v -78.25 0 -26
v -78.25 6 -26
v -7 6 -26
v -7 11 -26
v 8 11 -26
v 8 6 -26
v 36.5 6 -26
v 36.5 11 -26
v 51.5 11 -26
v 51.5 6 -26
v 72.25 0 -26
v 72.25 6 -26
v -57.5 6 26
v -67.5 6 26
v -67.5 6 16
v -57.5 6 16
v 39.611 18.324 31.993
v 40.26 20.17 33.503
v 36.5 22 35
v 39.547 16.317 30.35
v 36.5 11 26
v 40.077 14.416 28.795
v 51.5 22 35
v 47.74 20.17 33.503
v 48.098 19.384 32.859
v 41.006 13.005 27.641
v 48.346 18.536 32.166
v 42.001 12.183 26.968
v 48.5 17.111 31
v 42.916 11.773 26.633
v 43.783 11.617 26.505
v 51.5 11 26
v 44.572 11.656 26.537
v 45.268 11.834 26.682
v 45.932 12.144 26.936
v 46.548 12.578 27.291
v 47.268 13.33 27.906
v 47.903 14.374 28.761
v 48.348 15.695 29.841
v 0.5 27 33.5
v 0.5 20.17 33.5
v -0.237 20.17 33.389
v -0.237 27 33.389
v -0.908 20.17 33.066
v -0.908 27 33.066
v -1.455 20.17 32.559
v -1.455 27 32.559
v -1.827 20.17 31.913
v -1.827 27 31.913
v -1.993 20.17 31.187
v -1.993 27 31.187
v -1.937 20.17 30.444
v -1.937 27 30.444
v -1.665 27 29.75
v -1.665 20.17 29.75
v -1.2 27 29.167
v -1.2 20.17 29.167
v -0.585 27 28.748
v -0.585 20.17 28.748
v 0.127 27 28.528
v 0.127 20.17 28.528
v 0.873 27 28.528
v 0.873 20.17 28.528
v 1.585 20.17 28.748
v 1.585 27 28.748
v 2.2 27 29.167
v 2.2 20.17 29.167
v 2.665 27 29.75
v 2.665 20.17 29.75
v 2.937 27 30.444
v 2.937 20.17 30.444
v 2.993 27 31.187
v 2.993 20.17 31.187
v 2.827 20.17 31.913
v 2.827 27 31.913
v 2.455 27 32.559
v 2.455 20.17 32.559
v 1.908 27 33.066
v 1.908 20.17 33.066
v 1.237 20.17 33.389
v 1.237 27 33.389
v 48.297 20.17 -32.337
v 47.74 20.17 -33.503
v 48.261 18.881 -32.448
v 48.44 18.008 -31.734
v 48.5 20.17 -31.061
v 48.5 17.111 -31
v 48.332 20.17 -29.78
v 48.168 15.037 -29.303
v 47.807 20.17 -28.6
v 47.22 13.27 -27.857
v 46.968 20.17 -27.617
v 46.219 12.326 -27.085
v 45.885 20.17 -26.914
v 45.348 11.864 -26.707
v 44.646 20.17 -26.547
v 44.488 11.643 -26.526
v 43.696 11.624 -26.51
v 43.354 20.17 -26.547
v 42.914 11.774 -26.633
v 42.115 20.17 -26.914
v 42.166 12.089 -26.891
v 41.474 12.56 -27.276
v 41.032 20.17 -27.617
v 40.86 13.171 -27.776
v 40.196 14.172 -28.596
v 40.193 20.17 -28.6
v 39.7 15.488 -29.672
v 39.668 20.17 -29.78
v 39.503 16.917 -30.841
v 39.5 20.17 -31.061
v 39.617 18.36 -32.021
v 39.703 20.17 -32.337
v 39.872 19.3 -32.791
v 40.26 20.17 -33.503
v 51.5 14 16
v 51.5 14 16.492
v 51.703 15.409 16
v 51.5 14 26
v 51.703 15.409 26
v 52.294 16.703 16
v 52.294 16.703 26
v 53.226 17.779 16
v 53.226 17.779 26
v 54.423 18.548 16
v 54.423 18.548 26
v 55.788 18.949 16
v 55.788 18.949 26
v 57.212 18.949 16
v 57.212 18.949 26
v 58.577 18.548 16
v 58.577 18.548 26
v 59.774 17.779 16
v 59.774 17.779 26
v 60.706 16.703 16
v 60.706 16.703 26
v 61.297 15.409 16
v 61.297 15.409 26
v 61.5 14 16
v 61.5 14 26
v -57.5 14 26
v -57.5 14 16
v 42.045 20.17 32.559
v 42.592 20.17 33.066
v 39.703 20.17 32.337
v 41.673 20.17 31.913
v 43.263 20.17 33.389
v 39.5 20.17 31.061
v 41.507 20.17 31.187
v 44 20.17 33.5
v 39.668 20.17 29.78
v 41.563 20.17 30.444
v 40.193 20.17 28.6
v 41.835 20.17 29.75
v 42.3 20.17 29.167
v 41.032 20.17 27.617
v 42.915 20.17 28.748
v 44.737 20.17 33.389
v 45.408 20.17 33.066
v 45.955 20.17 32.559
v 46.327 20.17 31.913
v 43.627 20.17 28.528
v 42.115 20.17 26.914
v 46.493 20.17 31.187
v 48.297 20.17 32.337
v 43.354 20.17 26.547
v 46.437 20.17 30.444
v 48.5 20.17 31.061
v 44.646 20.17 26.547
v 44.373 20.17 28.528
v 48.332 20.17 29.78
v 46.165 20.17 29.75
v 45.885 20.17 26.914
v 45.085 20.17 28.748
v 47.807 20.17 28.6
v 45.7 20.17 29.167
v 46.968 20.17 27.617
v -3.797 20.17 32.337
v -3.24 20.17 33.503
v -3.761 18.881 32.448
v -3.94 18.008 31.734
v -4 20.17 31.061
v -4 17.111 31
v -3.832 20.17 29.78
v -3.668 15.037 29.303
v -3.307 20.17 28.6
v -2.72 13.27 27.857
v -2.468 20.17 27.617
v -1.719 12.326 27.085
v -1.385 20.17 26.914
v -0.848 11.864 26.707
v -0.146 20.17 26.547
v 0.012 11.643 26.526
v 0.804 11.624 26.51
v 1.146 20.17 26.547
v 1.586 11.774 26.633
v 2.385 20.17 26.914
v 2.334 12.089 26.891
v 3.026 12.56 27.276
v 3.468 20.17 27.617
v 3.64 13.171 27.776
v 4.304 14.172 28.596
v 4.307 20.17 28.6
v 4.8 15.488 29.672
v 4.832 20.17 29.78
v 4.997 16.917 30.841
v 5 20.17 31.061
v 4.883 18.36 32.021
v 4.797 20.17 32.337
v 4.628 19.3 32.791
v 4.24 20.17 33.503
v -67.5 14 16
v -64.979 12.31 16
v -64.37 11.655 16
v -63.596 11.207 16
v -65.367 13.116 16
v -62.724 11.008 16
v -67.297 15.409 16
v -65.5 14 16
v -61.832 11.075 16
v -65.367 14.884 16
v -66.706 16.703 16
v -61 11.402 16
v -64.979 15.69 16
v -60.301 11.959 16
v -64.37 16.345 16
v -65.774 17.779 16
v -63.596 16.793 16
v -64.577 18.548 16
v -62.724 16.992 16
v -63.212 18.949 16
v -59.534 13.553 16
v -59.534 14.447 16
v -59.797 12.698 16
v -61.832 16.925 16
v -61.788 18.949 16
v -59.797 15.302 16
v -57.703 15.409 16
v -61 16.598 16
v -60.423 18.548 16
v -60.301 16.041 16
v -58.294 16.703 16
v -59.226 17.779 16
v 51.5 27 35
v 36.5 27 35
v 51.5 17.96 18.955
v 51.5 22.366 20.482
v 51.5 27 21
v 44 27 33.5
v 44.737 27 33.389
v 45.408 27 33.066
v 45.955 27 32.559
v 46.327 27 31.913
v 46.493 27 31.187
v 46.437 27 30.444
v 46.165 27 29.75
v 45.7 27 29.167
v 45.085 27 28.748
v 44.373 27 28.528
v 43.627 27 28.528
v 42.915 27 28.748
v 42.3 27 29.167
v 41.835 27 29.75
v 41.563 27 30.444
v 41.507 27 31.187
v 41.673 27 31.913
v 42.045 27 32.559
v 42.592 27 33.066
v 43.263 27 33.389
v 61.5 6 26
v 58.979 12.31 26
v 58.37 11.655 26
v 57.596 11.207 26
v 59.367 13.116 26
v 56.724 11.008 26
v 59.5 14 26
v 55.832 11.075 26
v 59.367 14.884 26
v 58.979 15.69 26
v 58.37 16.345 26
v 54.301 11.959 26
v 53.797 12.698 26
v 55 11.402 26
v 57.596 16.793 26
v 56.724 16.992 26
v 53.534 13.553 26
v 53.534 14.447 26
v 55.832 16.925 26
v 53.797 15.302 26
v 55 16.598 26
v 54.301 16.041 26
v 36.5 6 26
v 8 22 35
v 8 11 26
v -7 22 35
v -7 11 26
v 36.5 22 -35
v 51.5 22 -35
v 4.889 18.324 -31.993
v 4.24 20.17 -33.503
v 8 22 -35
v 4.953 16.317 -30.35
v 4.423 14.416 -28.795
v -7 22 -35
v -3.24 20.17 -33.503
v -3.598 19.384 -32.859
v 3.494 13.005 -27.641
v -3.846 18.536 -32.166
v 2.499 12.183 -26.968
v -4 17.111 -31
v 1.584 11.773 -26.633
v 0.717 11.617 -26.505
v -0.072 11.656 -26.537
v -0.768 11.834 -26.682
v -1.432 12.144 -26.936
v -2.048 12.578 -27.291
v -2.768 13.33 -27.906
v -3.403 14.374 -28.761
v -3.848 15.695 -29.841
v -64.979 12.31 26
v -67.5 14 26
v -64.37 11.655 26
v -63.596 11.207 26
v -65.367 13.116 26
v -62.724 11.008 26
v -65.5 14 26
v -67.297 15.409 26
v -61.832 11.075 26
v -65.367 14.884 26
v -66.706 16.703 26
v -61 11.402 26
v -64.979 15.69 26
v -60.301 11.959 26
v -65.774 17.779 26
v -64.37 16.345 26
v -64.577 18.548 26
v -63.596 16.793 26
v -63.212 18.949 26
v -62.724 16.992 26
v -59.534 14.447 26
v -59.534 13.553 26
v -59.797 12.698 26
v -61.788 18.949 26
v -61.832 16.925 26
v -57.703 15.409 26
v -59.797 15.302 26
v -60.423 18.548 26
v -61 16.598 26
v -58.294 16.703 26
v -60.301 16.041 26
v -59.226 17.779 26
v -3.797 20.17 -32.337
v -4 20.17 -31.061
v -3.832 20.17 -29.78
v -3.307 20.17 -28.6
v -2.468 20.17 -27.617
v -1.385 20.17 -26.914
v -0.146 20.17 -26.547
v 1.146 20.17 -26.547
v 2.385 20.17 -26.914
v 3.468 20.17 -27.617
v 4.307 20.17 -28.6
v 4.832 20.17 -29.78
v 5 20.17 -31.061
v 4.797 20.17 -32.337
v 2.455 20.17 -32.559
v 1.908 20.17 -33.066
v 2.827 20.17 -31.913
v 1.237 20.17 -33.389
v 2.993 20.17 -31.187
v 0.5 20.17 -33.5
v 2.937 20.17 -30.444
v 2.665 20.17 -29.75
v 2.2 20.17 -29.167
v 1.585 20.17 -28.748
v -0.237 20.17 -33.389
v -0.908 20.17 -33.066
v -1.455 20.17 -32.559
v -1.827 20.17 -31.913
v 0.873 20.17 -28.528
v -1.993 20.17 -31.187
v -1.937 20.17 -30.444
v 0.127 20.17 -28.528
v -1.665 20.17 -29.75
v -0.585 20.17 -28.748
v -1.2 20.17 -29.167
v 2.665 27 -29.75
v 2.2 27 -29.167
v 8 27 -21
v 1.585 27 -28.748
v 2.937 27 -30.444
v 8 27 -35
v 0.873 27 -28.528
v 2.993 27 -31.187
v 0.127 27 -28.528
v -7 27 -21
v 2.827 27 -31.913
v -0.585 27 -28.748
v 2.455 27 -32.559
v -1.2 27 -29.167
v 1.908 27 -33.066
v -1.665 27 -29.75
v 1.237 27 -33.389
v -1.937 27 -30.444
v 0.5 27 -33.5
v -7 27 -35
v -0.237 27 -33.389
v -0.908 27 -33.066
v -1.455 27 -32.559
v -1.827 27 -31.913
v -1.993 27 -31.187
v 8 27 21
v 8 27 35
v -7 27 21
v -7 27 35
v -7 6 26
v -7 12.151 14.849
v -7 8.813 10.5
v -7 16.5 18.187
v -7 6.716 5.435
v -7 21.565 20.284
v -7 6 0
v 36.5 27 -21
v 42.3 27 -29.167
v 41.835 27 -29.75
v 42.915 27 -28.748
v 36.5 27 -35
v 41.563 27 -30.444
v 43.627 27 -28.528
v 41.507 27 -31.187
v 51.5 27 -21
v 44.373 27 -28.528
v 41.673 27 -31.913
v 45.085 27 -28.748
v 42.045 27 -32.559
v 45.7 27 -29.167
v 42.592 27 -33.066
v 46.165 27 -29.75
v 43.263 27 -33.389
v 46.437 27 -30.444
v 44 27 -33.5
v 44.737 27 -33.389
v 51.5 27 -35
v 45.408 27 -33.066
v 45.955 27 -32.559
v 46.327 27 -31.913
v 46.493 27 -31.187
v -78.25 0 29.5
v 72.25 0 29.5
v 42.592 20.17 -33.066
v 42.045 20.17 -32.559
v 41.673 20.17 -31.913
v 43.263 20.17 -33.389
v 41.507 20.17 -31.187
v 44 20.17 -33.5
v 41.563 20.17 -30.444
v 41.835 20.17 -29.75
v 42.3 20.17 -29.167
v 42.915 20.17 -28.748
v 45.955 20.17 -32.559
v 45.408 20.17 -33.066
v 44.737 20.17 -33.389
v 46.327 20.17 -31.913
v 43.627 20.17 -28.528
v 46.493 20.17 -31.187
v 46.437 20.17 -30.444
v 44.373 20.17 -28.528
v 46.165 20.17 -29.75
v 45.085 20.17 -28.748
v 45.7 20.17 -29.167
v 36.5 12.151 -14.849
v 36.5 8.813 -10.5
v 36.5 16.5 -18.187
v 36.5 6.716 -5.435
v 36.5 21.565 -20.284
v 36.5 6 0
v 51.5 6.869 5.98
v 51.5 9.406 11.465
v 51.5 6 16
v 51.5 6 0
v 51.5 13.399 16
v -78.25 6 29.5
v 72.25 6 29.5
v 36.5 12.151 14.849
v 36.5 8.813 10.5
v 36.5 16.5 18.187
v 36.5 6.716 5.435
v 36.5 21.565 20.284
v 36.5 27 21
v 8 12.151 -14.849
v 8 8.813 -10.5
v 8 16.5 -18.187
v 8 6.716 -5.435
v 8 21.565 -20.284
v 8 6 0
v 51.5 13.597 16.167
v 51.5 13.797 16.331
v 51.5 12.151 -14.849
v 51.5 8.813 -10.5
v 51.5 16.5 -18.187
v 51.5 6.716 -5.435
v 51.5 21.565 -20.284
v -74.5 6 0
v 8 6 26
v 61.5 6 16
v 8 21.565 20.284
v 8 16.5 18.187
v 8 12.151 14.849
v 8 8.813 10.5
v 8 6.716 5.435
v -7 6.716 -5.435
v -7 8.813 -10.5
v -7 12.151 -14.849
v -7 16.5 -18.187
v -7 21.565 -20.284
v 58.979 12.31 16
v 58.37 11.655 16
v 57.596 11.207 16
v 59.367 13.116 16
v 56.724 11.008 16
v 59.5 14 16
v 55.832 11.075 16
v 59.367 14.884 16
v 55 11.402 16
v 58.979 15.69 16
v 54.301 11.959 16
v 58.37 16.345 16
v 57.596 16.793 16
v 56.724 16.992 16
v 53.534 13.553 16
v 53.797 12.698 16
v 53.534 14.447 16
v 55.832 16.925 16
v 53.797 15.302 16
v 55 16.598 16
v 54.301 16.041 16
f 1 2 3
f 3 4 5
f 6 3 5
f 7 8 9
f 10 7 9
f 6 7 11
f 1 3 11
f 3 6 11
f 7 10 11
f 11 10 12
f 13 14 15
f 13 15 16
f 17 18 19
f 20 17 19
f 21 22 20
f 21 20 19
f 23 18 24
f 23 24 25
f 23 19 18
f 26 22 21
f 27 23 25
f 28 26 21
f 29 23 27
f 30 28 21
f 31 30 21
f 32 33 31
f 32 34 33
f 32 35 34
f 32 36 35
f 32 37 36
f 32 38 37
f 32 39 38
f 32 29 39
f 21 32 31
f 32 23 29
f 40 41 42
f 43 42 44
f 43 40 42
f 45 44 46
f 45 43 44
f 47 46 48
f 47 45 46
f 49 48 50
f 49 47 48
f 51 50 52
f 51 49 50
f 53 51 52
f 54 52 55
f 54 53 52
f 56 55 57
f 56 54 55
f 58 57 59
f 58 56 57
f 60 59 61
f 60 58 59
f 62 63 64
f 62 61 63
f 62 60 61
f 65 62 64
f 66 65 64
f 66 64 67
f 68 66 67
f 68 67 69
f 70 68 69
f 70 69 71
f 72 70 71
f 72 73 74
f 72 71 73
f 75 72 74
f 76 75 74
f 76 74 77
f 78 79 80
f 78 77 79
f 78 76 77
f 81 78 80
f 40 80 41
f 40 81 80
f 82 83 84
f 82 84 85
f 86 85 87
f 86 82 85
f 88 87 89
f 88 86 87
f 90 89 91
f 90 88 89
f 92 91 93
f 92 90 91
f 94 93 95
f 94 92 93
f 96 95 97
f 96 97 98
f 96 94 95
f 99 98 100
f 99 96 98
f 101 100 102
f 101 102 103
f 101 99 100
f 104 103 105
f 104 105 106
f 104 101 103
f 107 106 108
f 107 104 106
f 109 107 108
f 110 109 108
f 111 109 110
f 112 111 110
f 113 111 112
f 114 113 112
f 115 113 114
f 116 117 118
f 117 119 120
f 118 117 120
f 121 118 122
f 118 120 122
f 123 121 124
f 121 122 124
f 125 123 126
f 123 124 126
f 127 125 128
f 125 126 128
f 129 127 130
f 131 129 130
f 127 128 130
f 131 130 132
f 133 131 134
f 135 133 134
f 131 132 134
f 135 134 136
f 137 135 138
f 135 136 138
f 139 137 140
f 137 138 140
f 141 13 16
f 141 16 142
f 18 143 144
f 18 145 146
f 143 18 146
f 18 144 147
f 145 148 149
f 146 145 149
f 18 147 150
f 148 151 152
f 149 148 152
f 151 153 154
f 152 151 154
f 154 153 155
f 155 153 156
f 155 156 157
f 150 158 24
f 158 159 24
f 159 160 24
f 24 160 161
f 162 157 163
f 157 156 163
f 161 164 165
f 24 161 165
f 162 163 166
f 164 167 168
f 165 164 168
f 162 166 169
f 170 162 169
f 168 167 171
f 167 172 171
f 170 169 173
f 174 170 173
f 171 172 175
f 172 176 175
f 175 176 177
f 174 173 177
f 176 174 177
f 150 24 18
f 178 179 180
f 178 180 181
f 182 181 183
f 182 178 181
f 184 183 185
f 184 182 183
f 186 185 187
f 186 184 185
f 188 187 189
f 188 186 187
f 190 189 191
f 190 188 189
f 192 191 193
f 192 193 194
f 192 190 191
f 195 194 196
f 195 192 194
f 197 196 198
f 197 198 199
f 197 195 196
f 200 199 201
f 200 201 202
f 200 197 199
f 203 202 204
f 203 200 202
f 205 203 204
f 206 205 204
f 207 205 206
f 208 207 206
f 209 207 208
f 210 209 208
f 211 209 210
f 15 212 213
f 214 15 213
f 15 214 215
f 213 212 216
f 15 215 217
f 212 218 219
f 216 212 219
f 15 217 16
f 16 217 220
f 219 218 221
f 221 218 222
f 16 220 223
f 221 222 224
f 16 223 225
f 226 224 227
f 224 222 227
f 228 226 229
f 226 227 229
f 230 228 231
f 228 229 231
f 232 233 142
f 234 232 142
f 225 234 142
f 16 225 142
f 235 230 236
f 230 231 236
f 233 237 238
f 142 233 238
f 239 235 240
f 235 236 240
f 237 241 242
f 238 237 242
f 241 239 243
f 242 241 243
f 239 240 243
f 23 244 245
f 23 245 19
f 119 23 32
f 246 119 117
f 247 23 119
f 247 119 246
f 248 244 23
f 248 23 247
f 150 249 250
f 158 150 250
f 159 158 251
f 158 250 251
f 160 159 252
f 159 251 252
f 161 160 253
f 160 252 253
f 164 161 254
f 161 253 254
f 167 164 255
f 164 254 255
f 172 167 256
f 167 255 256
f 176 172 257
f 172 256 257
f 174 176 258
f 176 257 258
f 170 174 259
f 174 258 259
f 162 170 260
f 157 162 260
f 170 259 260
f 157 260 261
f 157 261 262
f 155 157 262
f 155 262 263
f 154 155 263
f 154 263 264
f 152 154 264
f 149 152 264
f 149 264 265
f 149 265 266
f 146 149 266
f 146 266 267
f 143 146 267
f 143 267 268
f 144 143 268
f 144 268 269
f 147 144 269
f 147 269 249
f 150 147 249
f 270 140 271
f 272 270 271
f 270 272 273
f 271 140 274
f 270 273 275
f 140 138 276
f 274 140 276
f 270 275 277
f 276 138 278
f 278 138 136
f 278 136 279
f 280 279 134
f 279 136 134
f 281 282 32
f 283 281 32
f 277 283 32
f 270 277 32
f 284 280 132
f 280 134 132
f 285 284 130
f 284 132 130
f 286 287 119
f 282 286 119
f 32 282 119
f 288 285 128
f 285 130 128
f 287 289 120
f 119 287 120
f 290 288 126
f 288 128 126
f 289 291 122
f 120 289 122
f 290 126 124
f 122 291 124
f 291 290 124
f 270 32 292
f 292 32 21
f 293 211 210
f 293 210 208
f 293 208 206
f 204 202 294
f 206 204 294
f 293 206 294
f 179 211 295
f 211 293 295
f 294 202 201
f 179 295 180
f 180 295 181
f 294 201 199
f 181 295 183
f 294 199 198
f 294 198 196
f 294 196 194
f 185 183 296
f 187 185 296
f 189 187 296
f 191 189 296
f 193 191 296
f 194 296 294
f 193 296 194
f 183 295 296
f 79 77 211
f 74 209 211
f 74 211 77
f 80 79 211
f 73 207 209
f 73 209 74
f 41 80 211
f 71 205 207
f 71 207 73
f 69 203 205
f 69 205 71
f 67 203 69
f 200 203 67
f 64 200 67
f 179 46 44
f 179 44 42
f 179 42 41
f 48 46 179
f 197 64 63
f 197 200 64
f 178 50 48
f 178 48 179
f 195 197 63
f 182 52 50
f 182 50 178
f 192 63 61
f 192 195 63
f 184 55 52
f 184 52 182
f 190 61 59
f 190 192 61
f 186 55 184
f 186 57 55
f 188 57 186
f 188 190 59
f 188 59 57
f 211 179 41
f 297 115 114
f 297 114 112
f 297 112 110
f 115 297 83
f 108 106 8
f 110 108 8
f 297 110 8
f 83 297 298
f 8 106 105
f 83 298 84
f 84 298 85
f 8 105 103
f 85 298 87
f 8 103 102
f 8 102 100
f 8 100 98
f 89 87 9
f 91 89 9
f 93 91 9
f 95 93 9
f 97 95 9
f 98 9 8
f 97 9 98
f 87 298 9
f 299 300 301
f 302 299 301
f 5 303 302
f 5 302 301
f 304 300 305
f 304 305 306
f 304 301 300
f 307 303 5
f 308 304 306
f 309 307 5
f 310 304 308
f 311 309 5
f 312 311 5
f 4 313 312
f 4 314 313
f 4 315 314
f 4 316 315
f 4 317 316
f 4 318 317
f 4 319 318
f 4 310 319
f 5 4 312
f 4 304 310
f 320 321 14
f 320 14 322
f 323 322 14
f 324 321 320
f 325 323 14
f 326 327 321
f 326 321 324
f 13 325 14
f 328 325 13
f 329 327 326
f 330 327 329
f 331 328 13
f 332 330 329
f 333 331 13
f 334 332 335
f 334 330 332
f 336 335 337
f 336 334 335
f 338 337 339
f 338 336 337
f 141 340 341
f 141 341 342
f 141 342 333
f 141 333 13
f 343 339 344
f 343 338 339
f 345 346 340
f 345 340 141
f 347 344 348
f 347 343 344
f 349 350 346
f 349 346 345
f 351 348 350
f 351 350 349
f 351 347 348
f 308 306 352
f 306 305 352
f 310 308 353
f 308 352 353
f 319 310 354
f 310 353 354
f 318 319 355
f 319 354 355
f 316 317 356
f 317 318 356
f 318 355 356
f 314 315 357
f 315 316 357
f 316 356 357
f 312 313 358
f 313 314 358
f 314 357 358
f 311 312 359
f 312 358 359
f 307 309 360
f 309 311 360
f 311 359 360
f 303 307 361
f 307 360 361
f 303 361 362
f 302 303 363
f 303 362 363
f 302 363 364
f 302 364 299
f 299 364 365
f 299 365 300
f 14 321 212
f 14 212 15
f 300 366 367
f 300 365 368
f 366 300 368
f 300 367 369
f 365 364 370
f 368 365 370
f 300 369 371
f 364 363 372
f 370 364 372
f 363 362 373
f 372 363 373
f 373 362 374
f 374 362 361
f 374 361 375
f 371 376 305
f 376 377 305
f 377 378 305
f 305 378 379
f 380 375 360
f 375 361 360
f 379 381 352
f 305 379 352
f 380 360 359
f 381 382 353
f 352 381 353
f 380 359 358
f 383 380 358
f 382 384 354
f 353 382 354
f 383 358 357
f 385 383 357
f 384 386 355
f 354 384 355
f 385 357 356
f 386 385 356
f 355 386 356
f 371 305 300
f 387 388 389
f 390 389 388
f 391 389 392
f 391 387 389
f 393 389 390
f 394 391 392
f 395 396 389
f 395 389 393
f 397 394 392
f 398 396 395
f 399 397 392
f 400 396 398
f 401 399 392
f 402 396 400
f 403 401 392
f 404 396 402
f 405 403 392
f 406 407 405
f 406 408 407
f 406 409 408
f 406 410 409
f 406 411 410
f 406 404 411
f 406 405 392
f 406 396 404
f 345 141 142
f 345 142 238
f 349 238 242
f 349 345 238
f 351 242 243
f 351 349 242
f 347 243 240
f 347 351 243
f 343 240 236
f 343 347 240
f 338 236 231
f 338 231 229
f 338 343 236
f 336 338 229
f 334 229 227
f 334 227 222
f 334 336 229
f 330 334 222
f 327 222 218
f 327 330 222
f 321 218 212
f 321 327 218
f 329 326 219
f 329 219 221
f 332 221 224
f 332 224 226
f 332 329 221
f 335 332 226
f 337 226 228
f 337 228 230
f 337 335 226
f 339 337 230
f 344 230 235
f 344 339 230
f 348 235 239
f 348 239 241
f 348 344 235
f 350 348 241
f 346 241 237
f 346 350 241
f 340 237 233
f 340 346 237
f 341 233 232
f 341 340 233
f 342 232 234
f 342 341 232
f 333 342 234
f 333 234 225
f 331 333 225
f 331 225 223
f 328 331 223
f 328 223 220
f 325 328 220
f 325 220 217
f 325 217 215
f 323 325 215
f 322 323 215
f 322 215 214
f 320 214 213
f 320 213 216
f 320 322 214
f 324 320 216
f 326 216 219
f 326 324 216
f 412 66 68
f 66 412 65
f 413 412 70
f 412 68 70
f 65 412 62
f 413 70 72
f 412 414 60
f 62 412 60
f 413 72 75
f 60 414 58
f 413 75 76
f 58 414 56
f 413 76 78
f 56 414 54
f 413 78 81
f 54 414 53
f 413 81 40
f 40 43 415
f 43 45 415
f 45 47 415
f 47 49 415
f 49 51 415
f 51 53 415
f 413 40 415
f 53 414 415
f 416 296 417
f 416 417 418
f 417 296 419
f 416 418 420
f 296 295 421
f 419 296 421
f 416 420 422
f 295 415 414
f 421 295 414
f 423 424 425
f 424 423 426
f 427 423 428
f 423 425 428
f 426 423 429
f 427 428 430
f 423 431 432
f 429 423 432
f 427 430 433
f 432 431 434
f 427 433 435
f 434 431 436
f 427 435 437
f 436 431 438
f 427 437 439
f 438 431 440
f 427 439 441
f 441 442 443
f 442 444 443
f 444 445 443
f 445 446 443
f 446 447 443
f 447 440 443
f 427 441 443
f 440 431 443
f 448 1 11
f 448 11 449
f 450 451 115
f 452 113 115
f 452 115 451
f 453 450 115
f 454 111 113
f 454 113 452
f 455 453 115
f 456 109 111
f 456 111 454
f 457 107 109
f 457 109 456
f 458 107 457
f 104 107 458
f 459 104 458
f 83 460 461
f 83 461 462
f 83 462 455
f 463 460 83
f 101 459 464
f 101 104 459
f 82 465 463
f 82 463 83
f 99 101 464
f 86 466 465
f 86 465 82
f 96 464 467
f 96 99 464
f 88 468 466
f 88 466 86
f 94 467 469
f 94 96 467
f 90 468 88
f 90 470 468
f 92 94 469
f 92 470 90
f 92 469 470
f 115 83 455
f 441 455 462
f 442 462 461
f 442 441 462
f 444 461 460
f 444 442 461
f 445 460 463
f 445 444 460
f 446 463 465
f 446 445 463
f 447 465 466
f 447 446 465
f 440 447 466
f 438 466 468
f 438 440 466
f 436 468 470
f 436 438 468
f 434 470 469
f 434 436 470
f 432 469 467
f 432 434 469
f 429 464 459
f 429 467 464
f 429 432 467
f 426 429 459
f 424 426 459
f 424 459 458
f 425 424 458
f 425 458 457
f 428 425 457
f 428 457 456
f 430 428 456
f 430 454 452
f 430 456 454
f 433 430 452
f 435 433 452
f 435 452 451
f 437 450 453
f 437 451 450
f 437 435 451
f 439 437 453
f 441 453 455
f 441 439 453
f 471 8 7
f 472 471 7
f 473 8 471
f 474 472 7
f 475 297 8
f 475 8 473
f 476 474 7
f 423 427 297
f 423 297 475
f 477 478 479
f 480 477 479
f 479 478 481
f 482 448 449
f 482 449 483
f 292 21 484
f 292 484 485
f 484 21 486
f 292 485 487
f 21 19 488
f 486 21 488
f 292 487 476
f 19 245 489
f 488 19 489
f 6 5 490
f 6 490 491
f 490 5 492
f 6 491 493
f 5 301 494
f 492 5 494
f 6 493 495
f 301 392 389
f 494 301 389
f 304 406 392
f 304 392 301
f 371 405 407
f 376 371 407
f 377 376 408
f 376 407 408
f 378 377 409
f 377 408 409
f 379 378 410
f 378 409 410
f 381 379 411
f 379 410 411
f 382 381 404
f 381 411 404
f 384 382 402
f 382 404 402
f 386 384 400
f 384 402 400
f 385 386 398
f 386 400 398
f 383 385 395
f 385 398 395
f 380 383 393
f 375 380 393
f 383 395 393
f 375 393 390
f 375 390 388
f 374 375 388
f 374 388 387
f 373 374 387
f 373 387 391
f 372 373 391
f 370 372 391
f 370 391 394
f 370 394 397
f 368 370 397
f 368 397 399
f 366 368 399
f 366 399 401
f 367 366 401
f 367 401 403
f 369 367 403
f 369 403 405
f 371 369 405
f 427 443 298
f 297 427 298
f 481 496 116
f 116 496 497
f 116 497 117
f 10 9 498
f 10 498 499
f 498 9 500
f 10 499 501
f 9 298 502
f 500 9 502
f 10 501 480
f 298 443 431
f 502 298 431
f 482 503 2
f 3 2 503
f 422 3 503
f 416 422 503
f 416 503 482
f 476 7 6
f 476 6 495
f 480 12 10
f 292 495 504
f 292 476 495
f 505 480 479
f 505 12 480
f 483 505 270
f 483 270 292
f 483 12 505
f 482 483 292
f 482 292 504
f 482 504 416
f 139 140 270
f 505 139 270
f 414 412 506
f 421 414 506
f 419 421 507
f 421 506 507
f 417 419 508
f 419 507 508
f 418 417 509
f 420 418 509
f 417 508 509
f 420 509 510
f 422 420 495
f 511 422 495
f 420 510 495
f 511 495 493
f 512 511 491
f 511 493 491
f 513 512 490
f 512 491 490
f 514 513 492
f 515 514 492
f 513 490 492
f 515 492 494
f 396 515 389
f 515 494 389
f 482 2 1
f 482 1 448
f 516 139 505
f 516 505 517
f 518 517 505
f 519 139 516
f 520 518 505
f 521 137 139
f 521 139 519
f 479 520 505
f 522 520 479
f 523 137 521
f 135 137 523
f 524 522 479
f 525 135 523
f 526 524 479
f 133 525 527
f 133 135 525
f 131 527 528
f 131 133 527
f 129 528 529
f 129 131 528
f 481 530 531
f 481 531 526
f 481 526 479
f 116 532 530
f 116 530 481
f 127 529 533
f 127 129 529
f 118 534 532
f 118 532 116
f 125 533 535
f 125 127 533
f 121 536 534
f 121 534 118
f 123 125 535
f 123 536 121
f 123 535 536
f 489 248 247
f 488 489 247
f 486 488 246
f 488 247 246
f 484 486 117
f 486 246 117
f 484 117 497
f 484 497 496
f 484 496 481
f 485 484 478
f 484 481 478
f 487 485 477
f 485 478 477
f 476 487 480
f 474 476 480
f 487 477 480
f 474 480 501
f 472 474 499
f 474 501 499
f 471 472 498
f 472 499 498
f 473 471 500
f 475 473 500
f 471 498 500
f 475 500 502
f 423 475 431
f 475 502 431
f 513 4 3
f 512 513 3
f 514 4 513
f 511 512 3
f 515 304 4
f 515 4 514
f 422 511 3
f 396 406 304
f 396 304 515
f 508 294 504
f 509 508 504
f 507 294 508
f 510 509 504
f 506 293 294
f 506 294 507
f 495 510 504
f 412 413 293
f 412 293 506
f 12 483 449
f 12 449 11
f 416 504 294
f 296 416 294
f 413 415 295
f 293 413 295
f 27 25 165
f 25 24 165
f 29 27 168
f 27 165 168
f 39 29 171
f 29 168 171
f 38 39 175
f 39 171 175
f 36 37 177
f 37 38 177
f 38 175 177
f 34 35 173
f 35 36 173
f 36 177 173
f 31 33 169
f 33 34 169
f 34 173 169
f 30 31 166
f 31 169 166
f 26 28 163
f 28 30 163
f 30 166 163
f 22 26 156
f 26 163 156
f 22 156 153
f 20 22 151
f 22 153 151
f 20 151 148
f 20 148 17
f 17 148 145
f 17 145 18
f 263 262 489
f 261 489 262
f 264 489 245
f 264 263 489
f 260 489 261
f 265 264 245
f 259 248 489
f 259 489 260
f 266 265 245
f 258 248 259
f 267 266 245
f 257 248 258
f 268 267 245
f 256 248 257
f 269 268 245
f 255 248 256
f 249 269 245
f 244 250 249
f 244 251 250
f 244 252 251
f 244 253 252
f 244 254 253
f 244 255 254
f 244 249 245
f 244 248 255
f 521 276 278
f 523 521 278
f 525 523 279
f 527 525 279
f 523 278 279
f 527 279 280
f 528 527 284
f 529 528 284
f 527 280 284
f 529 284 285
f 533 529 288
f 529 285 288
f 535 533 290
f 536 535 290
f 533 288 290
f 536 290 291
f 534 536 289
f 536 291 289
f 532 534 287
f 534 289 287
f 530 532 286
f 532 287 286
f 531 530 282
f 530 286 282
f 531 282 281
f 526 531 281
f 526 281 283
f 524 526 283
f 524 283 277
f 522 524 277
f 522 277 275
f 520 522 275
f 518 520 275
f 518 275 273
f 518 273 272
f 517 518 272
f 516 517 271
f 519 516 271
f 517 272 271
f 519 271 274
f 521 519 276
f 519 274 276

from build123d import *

# Parameters (mm, degrees)
CROQUIS1_W                                  = 149
CROQUIS1_H                                  = 53
SALIENTE_EXTRUIR1_DEPTH                     = 6
SALIENTE_EXTRUIR2_DEPTH                     = 15
SALIENTE_EXTRUIR5_DEPTH                     = 15
CROQUIS3_R                                  = 21
CORTAR_EXTRUIR2_DEPTH                       = 140.238105417
CROQUIS6_R                                  = 3
SALIENTE_EXTRUIR11_DEPTH                    = 10
CROQUIS10_W                                 = 149
CROQUIS10_H                                 = 6
SALIENTE_EXTRUIR23_DEPTH                    = 3
CROQUIS11_W                                 = 2.25
CROQUIS11_H                                 = 56
CORTAR_EXTRUIR3_DEPTH                       = 93.895102131
CROQUIS12_W                                 = 56
CROQUIS12_H                                 = 6
SALIENTE_EXTRUIR24_DEPTH                    = 3.75
CROQUIS13_W                                 = 150.5
CROQUIS13_H                                 = 0.5
CORTAR_EXTRUIR4_DEPTH                       = 96.928684448
CROQUIS14_W                                 = 169.427236994
CROQUIS14_H                                 = 76.033419256
CORTAR_EXTRUIR5_DEPTH                       = 88.876689173
SALIENTE_EXTRUIR25_DEPTH                    = 15
CROQUIS16_R                                 = 2.5
CORTAR_EXTRUIR6_DEPTH                       = 10
CROQUIS17_R                                 = 4.5
CORTAR_EXTRUIR7_DEPTH                       = 10
SIMETR_A14_AT_THE_SECOND_PLANE_COPY_1_DEPTH = 15
SIMETR_A14_AT_THE_SECOND_PLANE_COPY_2_SK_R  = 2.5
SIMETR_A14_AT_THE_SECOND_PLANE_COPY_2_DEPTH = 10
SIMETR_A14_AT_THE_SECOND_PLANE_COPY_3_SK_R  = 4.5
SIMETR_A14_AT_THE_SECOND_PLANE_COPY_3_DEPTH = 10


with BuildPart() as part:
    # Croquis1 → Saliente-Extruir1 (new body)
    with BuildSketch(Plane(origin=(0, 0, 0), x_dir=(1, 0, 0), z_dir=(0, 1, 0))):
        Rectangle(CROQUIS1_W, CROQUIS1_H)
    extrude(amount=SALIENTE_EXTRUIR1_DEPTH)

    # Croquis2 → Saliente-Extruir2 (add)
    with BuildSketch(Plane(origin=(51.5, 0, 0), x_dir=(0, 0, -1), z_dir=(1, 0, 0))):
        with BuildLine():
            Line((26, 6), (-26, 6))
            Line((-26, 6), (-26, 27))
            ThreePointArc((-26, 27), (0, 53), (26, 27))
            Line((26, 27), (26, 6))
        make_face()
    extrude(amount=-SALIENTE_EXTRUIR2_DEPTH)

    # Croquis5 → Saliente-Extruir5 (add)
    with BuildSketch(Plane.ZY.offset(-8)):
        with BuildLine():
            Line((-26, 6), (26, 6))
            Line((26, 6), (26, 27))
            ThreePointArc((26, 27), (0, 53), (-26, 27))
            Line((-26, 27), (-26, 6))
        make_face()
    extrude(amount=SALIENTE_EXTRUIR5_DEPTH)

    # Croquis3 → Cortar-Extruir2 (cut, through all)
    with BuildSketch(Plane(origin=(51.5, 0, 0), x_dir=(0, 0, -1), z_dir=(1, 0, 0))):
        with Locations(Location((0, 27, 0), (0, 0, 270))):
            Circle(CROQUIS3_R)
    extrude(amount=-CORTAR_EXTRUIR2_DEPTH, mode=Mode.SUBTRACT)

    # Croquis10 → Saliente-Extruir23 (add)
    with BuildSketch(Plane.XY.offset(26.5)):
        with Locations((0, 3)):
            Rectangle(CROQUIS10_W, CROQUIS10_H)
    extrude(amount=SALIENTE_EXTRUIR23_DEPTH)

    # Croquis11 → Cortar-Extruir3 (cut, through all)
    with BuildSketch(Plane(origin=(0, 6, 0), x_dir=(1, 0, 0), z_dir=(0, 1, 0))):
        with Locations((73.375, -1.5)):
            Rectangle(CROQUIS11_W, CROQUIS11_H)
    extrude(amount=-CORTAR_EXTRUIR3_DEPTH, mode=Mode.SUBTRACT)

    # Croquis12 → Saliente-Extruir24 (add)
    with BuildSketch(Plane.ZY.offset(74.5)):
        with Locations((1.5, 3)):
            Rectangle(CROQUIS12_W, CROQUIS12_H)
    extrude(amount=SALIENTE_EXTRUIR24_DEPTH)

    # Croquis13 → Cortar-Extruir4 (cut, through all)
    with BuildSketch(Plane(origin=(0, 6, 0), x_dir=(1, 0, 0), z_dir=(0, 1, 0))):
        with Locations((-3, 26.25)):
            Rectangle(CROQUIS13_W, CROQUIS13_H)
    extrude(amount=-CORTAR_EXTRUIR4_DEPTH, mode=Mode.SUBTRACT)

    # Croquis14 → Cortar-Extruir5 (cut, through all)
    with BuildSketch(Plane(origin=(0, 27, 0), x_dir=(-1, 0, 0), z_dir=(0, -1, 0))):
        Rectangle(CROQUIS14_W, CROQUIS14_H)
    extrude(amount=-CORTAR_EXTRUIR5_DEPTH, mode=Mode.SUBTRACT)



with BuildPart() as body_2:
    # Croquis6 → Saliente-Extruir11 (new body)
    with BuildSketch(Plane.XY.offset(26)):
        with BuildLine():
            Line((61.5, 6), (51.5, 6))
            Line((51.5, 6), (51.5, 14))
            ThreePointArc((51.5, 14), (56.5, 19), (61.5, 14))
            Line((61.5, 14), (61.5, 6))
        make_face()
        with Locations((56.5, 14)):
            Circle(CROQUIS6_R, mode=Mode.SUBTRACT)
    extrude(amount=-SALIENTE_EXTRUIR11_DEPTH)


with BuildPart() as body_3:
    # Simetría11: mirrored copy
    add(body_2.part.mirror(Plane(origin=(-3, 0, 0), x_dir=(0, 0, 1), z_dir=(1, 0, 0))))


with BuildPart() as part_1:
    add(part.part)

    add(body_2.part)  # Saliente-Extruir25 merges body 2
    # Croquis15 → Saliente-Extruir25 (add)
    with BuildSketch(Plane(origin=(51.5, 0, 0), x_dir=(0, 0, -1), z_dir=(1, 0, 0))):
        Polygon((-26, 27), (-35, 27), (-35, 22), (-26, 11), align=None)
    saliente_extruir25 = extrude(amount=-SALIENTE_EXTRUIR25_DEPTH)

    # Croquis16 → Cortar-Extruir6 (cut)
    with BuildSketch(Plane(origin=(0, 27, 0), x_dir=(1, 0, 0), z_dir=(0, 1, 0))):
        with Locations(Location((44, -31, 0), (0, 0, 270))):
            Circle(CROQUIS16_R)
    cortar_extruir6 = extrude(amount=-CORTAR_EXTRUIR6_DEPTH, mode=Mode.SUBTRACT)

    # Croquis17 → Cortar-Extruir7 (cut)
    with BuildSketch(Plane(origin=(0, 20.17, 0), x_dir=(1, 0, 0), z_dir=(0, 1, 0))):
        with Locations((44, -31)):
            Circle(CROQUIS17_R)
    cortar_extruir7 = extrude(amount=-CORTAR_EXTRUIR7_DEPTH, mode=Mode.SUBTRACT)

    # Simetría14: Saliente-Extruir25, Cortar-Extruir6, Cortar-Extruir7 across plane
    add(saliente_extruir25.mirror(Plane.XY))
    add(cortar_extruir6.mirror(Plane.XY), mode=Mode.SUBTRACT)
    add(cortar_extruir7.mirror(Plane.XY), mode=Mode.SUBTRACT)

    # Simetría14 at the second plane: Saliente-Extruir25, Cortar-Extruir6, Cortar-Extruir7 across plane
    add(saliente_extruir25.mirror(Plane.ZY.offset(-22.25)))
    add(cortar_extruir6.mirror(Plane.ZY.offset(-22.25)), mode=Mode.SUBTRACT)
    add(cortar_extruir7.mirror(Plane.ZY.offset(-22.25)), mode=Mode.SUBTRACT)

    # Simetría14 at the second plane copy 1 sk → Simetría14 at the second plane copy 1 (add)
    with BuildSketch(Plane.ZY.offset(7)):
        Polygon((-26, 27), (-35, 27), (-35, 22), (-26, 11), align=None)
    extrude(amount=-SIMETR_A14_AT_THE_SECOND_PLANE_COPY_1_DEPTH)

    # Simetría14 at the second plane copy 2 sk → Simetría14 at the second plane copy 2 (cut)
    with BuildSketch(Plane(origin=(44.5, 27, 0), x_dir=(-1, 0, 0), z_dir=(0, 1, 0))):
        with Locations(Location((44, -31, 0), (0, 0, 270))):
            Circle(SIMETR_A14_AT_THE_SECOND_PLANE_COPY_2_SK_R)
    extrude(amount=-SIMETR_A14_AT_THE_SECOND_PLANE_COPY_2_DEPTH, mode=Mode.SUBTRACT)

    # Simetría14 at the second plane copy 3 sk → Simetría14 at the second plane copy 3 (cut)
    with BuildSketch(Plane(origin=(44.5, 20.17, 0), x_dir=(-1, 0, 0), z_dir=(0, 1, 0))):
        with Locations((44, -31)):
            Circle(SIMETR_A14_AT_THE_SECOND_PLANE_COPY_3_SK_R)
    extrude(amount=-SIMETR_A14_AT_THE_SECOND_PLANE_COPY_3_DEPTH, mode=Mode.SUBTRACT)


solid = Compound([body_3.part, part_1.part])
